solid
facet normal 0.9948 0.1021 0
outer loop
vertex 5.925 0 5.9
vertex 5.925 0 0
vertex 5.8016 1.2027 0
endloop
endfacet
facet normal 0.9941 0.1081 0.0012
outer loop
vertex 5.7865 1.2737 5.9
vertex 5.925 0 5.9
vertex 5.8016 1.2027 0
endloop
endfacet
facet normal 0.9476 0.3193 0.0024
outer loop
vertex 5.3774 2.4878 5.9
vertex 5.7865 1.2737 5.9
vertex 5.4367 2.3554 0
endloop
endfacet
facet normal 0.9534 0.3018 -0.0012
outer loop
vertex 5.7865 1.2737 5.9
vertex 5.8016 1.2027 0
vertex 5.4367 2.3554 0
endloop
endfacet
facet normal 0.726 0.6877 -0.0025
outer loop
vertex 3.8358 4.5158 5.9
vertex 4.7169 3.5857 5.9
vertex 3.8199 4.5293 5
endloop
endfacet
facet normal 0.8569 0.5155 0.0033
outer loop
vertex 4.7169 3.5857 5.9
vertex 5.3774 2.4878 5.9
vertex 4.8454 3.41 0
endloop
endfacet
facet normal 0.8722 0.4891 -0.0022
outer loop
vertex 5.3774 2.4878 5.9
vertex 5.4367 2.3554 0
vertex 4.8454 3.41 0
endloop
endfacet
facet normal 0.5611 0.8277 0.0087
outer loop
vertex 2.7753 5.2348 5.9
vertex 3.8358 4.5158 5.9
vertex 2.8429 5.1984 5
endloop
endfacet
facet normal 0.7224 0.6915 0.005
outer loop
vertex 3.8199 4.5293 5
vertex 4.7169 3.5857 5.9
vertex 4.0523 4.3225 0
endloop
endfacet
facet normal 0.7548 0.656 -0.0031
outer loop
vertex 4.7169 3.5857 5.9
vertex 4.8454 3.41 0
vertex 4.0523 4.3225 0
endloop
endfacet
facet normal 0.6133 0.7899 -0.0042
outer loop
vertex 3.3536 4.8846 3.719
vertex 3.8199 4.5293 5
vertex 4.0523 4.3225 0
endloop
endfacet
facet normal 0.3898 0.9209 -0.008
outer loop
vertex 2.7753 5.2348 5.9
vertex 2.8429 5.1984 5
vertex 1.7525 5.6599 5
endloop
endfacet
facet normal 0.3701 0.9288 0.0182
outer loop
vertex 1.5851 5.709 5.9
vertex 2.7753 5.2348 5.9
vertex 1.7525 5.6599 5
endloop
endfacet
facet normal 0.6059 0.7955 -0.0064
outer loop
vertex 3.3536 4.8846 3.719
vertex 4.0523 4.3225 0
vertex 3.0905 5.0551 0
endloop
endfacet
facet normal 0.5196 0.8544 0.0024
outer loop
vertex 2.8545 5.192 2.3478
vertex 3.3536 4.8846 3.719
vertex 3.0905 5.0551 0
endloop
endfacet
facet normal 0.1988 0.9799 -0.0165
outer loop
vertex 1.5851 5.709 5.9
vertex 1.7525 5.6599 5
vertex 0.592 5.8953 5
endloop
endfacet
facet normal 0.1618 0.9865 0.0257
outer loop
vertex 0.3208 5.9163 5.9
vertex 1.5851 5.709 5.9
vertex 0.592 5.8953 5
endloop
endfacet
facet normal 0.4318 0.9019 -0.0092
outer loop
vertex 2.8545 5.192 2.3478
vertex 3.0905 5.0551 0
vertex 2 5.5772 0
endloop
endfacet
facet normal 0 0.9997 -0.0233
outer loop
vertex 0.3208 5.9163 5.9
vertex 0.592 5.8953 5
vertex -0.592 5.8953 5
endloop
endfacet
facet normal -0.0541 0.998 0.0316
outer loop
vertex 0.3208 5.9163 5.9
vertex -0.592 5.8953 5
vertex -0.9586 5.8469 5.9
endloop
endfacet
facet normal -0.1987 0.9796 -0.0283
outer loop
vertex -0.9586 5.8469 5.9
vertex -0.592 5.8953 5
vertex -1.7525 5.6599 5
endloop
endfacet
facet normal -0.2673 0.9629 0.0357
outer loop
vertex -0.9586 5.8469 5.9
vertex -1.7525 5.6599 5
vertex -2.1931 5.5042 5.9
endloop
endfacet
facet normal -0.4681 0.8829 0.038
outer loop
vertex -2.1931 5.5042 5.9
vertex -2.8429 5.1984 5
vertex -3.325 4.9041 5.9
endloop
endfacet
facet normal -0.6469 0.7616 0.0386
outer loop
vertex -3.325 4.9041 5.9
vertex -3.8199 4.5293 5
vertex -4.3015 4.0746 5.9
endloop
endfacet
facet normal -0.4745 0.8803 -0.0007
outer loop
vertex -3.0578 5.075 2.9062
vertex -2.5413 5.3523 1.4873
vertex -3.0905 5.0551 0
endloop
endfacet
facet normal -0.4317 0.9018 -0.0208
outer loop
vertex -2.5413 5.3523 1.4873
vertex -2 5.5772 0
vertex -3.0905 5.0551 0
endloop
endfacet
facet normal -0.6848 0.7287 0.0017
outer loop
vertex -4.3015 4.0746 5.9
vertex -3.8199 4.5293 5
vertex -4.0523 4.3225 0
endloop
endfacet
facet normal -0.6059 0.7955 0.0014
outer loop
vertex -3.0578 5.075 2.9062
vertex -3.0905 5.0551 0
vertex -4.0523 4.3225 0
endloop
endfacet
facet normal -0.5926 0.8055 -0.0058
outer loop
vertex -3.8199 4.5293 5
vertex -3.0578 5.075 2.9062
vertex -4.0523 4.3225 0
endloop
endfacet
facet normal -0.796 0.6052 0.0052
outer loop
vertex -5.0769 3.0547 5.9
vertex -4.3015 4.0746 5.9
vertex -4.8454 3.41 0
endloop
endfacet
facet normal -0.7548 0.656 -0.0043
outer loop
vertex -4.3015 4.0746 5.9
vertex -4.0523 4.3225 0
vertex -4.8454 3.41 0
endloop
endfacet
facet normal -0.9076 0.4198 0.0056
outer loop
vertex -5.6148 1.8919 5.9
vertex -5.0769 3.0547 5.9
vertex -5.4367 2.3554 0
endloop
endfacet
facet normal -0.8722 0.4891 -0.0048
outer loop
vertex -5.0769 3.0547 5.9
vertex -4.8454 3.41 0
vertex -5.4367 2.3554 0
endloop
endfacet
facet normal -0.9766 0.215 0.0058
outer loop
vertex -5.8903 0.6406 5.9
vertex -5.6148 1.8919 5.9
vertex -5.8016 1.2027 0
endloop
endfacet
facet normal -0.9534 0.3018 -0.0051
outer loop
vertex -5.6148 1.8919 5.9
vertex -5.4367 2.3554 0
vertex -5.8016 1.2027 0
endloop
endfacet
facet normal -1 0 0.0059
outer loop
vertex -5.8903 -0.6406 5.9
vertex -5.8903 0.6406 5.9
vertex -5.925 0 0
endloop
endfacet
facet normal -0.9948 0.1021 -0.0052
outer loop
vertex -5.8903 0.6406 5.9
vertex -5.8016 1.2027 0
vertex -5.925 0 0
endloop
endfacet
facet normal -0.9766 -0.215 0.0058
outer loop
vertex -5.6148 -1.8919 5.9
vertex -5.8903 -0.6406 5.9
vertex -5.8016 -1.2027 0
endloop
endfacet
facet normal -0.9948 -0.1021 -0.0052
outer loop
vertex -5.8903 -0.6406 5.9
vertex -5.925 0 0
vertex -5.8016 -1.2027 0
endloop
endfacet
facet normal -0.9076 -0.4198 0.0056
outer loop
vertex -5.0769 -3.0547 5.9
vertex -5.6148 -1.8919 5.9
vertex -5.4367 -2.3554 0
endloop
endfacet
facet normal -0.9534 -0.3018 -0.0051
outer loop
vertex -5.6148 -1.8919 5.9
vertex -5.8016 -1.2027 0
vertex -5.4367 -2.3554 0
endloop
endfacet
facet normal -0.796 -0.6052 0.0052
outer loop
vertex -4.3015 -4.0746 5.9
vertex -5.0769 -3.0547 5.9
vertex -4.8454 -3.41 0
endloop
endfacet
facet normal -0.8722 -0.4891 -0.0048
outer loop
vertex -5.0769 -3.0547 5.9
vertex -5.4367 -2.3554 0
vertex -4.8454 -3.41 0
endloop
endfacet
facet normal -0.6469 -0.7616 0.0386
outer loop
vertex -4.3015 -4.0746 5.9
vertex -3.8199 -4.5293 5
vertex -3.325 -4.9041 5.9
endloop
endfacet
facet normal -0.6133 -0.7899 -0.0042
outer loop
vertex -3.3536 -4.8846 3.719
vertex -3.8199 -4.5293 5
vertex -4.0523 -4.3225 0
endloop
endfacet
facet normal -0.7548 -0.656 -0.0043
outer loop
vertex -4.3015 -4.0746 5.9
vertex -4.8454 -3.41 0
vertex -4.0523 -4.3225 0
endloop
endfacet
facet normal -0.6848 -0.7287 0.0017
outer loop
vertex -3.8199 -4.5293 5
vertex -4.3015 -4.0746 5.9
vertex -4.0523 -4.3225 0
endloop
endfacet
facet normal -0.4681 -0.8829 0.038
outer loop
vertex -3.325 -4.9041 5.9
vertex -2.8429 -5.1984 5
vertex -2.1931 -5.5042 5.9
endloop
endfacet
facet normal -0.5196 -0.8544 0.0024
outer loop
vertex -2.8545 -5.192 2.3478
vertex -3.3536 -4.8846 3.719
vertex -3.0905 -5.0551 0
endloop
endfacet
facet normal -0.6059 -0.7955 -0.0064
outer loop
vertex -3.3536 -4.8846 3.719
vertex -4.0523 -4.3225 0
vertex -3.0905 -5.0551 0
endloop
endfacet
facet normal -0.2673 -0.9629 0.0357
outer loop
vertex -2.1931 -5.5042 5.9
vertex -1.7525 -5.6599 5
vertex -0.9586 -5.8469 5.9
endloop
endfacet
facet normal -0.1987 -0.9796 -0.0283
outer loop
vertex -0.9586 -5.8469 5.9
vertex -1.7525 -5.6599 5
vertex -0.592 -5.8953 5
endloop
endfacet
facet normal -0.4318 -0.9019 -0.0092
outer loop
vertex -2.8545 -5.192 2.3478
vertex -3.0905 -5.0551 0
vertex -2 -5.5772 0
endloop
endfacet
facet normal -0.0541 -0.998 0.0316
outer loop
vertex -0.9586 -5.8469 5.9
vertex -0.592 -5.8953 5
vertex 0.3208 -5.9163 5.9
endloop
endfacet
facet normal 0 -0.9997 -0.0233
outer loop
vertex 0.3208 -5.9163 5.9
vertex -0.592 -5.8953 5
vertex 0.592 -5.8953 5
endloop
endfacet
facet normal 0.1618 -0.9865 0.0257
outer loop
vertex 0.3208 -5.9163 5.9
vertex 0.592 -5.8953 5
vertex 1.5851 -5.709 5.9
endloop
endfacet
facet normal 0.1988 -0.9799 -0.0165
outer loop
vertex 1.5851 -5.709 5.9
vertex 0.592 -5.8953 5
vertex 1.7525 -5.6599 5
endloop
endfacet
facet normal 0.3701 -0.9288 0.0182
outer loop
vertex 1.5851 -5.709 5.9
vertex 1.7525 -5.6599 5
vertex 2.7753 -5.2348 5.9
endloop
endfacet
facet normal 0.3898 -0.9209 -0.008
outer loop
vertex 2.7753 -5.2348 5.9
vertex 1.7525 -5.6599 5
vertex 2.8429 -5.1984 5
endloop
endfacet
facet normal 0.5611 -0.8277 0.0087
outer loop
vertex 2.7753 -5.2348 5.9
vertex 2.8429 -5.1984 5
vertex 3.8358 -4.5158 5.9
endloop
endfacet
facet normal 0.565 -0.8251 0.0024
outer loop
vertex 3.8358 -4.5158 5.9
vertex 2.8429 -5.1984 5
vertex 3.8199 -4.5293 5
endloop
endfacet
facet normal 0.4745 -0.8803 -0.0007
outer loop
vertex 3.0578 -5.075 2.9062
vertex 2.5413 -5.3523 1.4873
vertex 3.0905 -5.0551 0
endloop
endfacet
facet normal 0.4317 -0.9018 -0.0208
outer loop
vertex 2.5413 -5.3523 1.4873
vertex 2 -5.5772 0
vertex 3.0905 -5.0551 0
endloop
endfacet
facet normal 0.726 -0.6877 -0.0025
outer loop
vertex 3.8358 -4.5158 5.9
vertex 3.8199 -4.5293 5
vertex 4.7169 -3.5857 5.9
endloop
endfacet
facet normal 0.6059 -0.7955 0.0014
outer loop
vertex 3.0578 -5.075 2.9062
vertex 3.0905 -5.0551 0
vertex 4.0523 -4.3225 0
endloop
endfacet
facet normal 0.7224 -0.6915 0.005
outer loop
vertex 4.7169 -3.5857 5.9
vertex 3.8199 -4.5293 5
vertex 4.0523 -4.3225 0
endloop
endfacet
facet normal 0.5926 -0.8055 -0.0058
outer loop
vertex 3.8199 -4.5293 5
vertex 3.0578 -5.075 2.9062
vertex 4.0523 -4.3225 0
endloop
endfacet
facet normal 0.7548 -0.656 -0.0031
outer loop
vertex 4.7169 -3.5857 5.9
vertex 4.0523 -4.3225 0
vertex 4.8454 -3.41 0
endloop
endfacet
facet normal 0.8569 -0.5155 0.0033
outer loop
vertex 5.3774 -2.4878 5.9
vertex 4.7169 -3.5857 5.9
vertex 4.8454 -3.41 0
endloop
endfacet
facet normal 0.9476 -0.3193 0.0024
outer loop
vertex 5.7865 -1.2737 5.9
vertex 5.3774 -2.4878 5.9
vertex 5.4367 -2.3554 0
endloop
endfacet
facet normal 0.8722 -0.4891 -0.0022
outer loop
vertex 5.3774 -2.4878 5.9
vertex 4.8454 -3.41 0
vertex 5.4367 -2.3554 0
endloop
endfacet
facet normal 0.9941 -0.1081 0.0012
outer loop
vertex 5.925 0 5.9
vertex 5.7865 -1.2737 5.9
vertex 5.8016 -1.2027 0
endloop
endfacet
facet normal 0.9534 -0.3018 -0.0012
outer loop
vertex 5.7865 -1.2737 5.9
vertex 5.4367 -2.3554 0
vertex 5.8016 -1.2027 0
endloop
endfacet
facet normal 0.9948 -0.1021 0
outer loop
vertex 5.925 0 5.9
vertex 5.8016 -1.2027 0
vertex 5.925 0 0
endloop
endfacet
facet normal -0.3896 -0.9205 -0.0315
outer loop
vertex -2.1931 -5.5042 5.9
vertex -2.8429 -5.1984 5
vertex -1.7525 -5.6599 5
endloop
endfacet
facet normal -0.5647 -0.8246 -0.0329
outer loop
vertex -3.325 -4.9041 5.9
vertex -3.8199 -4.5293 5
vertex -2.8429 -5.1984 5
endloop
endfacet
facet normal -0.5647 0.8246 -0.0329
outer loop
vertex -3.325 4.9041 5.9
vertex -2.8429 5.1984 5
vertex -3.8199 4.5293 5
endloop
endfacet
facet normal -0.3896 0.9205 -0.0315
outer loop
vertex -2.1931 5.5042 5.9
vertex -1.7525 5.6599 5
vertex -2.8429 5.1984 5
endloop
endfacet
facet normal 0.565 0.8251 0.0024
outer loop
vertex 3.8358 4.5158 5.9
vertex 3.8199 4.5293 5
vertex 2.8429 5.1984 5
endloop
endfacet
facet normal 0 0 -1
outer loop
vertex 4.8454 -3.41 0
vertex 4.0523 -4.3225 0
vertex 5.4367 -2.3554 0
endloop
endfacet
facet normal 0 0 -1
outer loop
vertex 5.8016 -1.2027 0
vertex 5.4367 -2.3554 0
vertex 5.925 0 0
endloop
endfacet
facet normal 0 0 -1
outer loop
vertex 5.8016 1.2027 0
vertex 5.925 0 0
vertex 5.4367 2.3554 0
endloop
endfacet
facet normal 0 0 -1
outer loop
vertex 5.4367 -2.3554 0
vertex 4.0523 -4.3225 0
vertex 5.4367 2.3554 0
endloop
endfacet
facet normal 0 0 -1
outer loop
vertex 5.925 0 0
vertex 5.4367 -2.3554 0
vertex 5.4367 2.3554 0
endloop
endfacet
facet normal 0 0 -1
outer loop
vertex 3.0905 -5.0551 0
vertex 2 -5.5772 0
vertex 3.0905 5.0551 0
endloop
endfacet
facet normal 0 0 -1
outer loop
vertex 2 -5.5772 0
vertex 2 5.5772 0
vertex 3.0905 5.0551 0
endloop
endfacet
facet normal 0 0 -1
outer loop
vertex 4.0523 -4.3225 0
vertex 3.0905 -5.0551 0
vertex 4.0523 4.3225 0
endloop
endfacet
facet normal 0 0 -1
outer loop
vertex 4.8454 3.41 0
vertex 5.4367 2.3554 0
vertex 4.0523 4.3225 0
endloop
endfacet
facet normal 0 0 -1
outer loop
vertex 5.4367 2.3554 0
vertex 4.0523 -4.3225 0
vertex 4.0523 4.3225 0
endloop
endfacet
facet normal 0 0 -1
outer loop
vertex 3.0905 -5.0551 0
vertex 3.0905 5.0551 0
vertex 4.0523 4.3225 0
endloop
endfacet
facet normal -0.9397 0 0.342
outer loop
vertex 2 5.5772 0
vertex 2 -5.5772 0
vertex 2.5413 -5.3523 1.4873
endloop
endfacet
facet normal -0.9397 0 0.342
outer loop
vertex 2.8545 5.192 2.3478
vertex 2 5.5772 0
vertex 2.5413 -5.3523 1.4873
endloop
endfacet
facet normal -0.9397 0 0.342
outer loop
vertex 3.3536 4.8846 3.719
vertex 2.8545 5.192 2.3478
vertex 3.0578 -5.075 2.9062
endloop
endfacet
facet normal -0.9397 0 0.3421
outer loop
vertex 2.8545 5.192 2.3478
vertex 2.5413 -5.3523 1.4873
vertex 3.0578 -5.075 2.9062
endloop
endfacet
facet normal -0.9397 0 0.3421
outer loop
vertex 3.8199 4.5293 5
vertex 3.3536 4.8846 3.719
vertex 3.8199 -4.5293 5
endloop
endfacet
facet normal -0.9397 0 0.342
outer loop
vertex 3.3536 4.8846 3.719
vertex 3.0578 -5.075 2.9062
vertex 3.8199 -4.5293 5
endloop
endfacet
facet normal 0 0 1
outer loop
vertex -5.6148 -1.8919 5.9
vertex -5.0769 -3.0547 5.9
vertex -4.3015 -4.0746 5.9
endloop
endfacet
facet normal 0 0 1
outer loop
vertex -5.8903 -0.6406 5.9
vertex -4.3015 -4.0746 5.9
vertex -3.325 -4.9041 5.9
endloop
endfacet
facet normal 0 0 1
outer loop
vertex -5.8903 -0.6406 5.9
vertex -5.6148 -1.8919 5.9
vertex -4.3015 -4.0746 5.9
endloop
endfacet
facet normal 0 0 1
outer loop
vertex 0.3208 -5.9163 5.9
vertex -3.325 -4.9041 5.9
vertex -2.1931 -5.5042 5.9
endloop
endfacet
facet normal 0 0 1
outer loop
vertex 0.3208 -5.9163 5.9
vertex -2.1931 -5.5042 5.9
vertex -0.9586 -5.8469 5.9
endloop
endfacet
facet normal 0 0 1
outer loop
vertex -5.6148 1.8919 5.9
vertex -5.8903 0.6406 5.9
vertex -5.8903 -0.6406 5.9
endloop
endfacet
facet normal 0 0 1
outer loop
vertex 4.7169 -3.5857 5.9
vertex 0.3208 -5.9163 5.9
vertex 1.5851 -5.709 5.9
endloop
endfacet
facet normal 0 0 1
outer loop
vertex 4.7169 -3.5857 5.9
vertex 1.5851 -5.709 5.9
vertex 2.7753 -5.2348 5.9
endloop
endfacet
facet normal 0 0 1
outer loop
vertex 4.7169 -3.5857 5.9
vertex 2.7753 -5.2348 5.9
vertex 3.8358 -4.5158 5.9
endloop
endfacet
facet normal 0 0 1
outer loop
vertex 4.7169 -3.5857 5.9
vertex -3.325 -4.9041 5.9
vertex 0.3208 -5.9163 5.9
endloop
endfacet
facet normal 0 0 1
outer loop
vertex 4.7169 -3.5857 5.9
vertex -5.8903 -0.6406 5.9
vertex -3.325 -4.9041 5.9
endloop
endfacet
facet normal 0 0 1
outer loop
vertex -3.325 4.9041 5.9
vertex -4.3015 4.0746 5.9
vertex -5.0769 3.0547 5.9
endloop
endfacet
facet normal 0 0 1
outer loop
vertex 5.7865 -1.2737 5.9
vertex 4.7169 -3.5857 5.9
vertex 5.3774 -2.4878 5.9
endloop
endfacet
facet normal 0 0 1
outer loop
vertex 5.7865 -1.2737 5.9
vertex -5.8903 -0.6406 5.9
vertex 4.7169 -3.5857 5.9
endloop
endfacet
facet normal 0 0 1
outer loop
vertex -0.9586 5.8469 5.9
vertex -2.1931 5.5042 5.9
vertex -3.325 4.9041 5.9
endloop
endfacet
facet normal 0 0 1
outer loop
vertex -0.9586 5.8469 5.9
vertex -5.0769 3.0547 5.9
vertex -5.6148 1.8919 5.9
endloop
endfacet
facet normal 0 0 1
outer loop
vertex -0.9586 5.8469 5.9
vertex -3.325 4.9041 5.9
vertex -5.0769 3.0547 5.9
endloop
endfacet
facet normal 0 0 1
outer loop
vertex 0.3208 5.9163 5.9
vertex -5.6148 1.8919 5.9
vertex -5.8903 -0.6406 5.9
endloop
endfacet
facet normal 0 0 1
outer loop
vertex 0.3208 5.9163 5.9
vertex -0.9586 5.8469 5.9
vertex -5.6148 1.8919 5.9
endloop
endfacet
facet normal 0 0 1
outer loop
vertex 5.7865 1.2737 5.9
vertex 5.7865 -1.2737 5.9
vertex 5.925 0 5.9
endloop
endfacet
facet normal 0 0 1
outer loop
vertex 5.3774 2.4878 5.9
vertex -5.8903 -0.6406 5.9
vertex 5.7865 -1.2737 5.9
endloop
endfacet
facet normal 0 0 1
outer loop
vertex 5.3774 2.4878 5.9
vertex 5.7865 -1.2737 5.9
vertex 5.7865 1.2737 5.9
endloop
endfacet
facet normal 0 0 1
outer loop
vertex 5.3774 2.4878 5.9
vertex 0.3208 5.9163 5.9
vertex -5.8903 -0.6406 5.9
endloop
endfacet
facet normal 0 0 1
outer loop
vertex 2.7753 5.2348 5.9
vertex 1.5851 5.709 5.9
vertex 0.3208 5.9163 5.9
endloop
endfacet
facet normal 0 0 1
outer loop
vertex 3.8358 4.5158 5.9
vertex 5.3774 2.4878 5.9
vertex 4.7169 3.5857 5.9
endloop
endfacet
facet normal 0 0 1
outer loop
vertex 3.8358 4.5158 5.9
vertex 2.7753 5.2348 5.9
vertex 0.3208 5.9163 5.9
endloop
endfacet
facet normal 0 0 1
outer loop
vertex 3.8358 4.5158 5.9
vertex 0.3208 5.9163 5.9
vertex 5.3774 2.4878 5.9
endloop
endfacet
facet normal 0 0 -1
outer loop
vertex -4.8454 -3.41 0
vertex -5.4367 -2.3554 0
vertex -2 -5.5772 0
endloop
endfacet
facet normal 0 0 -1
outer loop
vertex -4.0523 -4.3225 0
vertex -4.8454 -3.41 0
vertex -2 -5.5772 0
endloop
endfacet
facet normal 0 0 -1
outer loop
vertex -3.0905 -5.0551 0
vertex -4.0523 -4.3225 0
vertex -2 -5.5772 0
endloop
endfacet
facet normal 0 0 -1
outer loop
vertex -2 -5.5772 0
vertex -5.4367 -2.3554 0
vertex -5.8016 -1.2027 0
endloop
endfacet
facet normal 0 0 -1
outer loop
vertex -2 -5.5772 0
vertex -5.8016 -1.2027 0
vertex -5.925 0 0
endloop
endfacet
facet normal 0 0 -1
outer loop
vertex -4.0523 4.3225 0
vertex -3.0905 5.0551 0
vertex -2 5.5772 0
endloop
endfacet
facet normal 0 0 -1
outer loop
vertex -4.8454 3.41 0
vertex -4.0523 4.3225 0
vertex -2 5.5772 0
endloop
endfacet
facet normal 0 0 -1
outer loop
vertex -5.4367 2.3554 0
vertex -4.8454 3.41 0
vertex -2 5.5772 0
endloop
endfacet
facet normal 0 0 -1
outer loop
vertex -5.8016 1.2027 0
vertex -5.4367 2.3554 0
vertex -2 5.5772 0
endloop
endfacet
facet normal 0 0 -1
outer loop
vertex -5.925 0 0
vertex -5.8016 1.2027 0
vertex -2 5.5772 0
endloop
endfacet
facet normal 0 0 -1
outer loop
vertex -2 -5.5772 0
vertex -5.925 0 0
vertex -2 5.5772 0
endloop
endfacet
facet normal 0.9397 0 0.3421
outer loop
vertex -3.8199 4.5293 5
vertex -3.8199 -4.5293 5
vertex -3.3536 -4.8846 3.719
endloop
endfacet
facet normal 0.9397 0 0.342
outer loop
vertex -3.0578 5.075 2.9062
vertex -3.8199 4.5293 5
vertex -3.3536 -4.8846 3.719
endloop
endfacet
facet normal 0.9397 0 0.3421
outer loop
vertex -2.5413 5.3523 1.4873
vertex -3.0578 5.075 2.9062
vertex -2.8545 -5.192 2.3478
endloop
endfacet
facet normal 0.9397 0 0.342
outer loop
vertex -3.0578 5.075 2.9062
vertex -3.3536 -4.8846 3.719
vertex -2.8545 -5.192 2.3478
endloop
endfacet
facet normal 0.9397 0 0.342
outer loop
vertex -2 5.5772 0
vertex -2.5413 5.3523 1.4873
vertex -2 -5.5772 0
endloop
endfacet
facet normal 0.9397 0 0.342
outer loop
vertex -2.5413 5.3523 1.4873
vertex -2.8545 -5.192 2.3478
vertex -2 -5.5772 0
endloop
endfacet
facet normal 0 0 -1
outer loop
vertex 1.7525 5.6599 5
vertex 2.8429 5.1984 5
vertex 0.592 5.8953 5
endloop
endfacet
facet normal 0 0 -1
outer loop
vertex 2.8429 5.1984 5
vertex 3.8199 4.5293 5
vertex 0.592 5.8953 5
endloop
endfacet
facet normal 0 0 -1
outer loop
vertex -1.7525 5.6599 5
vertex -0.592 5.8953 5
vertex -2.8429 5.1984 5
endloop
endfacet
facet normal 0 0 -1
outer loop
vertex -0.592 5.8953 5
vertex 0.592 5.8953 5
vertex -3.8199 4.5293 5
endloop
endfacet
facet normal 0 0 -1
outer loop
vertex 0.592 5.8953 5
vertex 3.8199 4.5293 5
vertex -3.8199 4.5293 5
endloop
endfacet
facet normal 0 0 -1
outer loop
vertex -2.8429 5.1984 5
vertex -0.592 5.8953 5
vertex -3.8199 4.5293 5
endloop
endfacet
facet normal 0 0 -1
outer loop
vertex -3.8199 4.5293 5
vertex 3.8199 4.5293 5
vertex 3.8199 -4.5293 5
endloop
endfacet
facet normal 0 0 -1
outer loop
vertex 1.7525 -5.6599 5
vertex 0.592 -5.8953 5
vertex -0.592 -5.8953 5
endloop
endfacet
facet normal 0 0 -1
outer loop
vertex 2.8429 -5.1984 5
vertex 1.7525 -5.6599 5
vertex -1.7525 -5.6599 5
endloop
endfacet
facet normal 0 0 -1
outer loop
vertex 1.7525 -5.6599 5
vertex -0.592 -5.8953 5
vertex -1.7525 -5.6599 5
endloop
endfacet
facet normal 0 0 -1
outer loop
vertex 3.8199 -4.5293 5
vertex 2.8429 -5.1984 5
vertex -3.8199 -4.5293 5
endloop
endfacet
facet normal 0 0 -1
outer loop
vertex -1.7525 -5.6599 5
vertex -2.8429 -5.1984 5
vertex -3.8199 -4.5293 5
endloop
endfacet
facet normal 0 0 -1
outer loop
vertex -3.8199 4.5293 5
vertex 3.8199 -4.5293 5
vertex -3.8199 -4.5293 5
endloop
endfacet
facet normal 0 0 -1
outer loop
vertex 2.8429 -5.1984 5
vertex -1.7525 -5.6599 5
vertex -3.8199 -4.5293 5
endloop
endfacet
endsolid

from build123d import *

# Parameters (mm, degrees)
F0_R     = 5.925
F1_DEPTH = 5.9
F3_DEPTH = 12.5


with BuildPart() as f1:
    # F0 (on Top) → F1 (new body)
    with BuildSketch(Plane.XY):
        Circle(F0_R)
    extrude(amount=F1_DEPTH)

    # F2 (on Front) → F3 (cut, symmetric)
    with BuildSketch(Plane.XZ):
        Polygon((-2, 0), (0, 0), (2, 0), (3.819851, 5), (-3.819851, 5), align=None)
    extrude(amount=F3_DEPTH, both=True, mode=Mode.SUBTRACT)


solid = f1.part
